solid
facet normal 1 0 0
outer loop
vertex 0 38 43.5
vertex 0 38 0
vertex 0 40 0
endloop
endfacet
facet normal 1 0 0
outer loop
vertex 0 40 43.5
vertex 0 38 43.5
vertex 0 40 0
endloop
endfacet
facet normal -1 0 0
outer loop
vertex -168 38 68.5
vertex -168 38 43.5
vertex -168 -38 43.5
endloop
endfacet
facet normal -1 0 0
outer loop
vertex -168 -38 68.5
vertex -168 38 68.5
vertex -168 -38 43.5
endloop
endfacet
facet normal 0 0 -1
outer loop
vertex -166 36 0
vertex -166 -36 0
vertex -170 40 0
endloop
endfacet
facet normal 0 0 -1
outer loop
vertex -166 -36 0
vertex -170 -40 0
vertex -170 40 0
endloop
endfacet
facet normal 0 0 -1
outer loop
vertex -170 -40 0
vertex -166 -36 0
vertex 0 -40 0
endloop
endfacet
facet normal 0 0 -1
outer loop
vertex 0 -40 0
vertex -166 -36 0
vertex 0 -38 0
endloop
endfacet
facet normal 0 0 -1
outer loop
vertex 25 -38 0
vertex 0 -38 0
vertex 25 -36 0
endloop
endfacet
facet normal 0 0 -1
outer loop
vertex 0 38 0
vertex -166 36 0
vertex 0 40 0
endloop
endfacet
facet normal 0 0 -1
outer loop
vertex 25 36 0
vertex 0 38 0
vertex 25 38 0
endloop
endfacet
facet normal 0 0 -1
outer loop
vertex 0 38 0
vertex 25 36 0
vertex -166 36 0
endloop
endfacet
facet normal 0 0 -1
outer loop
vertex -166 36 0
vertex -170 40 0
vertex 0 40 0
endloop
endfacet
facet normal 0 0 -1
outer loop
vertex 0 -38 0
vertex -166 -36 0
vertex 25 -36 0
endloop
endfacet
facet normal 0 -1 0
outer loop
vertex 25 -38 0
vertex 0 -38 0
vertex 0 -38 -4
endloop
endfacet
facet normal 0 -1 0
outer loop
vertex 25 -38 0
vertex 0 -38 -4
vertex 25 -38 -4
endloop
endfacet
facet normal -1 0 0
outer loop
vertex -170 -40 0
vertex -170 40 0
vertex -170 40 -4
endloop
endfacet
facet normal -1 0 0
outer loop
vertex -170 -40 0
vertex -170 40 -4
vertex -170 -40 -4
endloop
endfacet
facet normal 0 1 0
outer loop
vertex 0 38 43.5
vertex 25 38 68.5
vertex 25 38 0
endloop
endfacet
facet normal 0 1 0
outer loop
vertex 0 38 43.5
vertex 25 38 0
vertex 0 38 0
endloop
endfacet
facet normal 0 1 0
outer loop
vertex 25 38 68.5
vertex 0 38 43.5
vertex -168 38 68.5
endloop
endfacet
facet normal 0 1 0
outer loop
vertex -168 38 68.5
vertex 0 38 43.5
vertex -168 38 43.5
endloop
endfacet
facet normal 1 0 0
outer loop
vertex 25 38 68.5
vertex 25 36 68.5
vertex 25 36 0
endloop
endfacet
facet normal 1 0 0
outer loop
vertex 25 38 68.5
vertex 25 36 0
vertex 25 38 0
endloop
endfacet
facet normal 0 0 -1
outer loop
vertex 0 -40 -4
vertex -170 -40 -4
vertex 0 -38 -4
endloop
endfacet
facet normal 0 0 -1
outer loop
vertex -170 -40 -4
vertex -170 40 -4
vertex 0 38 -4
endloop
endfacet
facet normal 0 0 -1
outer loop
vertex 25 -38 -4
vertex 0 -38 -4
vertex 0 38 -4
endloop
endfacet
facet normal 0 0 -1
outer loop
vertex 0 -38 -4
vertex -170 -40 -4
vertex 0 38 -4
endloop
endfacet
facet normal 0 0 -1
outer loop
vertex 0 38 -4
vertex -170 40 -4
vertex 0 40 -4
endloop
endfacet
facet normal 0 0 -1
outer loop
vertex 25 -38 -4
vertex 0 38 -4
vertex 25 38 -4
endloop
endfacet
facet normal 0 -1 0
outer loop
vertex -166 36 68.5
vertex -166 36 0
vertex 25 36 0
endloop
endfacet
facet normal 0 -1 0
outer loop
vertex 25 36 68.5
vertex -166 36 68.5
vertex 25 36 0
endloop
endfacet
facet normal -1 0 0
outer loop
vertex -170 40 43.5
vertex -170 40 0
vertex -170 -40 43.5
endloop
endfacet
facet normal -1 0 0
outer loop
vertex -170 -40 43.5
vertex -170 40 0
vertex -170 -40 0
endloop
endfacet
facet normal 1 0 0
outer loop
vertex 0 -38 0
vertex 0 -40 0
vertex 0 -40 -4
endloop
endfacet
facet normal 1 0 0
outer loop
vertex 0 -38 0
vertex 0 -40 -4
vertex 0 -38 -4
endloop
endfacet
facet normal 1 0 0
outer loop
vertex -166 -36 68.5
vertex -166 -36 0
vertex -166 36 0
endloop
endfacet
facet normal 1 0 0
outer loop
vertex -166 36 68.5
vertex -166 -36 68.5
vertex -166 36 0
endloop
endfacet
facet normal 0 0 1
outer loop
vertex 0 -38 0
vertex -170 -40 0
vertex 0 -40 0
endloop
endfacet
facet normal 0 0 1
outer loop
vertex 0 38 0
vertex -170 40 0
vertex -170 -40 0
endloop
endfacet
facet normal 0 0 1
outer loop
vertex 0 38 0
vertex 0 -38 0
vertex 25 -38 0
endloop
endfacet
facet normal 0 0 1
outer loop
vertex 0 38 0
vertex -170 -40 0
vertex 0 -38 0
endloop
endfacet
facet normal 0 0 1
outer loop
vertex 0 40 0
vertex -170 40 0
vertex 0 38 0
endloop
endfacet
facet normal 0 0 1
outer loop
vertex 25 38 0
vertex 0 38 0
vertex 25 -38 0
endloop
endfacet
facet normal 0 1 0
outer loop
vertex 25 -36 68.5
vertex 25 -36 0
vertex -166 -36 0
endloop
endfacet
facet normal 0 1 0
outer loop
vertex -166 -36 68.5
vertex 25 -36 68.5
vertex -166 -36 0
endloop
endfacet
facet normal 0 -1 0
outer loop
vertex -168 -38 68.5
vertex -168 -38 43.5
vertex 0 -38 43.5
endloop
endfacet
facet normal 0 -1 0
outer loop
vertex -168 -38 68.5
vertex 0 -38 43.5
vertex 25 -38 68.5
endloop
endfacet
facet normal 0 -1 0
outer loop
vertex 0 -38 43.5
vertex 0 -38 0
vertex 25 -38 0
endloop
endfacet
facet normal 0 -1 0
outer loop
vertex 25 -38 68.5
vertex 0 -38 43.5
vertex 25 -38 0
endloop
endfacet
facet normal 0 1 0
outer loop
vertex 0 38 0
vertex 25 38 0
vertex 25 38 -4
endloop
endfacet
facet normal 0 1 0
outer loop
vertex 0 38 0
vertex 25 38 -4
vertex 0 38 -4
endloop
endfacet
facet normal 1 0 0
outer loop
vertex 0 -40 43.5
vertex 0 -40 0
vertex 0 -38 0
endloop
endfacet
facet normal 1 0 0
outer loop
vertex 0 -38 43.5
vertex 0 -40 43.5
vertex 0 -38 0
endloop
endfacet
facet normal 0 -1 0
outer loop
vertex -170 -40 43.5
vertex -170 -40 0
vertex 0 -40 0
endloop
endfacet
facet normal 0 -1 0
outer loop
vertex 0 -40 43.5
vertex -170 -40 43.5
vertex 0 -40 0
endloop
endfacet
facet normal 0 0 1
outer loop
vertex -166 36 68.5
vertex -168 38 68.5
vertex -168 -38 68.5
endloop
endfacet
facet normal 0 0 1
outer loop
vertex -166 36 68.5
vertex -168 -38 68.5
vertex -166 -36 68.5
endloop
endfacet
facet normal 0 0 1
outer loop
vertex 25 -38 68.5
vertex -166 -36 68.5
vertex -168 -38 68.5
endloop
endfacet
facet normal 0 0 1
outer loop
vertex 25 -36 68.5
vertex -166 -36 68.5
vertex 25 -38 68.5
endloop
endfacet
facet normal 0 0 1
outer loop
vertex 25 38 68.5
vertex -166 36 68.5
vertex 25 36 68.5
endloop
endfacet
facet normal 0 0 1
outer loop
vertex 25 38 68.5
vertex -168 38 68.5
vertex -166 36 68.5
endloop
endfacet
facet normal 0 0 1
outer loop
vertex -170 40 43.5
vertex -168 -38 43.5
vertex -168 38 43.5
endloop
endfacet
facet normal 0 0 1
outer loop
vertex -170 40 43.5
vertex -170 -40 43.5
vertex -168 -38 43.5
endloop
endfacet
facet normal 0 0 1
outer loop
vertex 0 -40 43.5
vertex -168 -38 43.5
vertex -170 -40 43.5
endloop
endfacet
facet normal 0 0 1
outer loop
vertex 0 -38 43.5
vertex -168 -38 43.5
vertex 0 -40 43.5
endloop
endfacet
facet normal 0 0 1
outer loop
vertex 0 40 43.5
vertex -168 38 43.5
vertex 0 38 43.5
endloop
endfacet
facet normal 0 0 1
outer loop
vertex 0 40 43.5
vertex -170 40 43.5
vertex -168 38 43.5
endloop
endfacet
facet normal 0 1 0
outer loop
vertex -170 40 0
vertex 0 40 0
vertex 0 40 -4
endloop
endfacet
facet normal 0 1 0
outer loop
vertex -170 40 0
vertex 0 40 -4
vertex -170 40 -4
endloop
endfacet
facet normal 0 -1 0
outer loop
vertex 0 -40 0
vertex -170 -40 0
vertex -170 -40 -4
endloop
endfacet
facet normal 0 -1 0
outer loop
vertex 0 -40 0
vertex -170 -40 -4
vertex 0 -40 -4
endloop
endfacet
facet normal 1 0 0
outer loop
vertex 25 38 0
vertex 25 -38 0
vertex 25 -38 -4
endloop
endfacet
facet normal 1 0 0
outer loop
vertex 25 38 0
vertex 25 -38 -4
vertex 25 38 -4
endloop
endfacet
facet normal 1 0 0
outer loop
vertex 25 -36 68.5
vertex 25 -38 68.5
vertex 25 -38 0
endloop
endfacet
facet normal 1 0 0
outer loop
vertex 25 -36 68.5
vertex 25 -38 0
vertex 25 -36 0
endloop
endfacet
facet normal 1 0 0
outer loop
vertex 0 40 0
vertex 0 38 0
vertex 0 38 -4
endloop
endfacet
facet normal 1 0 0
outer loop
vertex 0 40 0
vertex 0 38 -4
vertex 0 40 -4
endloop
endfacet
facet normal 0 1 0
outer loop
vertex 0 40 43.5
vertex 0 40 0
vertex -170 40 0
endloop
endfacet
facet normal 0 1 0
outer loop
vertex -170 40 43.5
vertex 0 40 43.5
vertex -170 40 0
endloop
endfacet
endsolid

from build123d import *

# Parameters (mm, degrees)
F0_W     = 25
F0_H     = 2
F1_DEPTH = 43.5
F0_H_2   = 72
F2_DEPTH = 4
F4_DEPTH = 25


with BuildPart() as f1:
    # F0 (on Top) → F1 (new body)
    with BuildSketch(Plane.XY):
        Polygon((-166, 0), (-166, 36), (0, 36), (25, 36), (25, 38), (0, 38), (0, 40), (-170, 40), (-170, -40), (0, -40), (0, -38), (0, -36), (-166, -36), align=None)
        with Locations((12.5, -37)):
            Rectangle(F0_W, F0_H)
    extrude(amount=F1_DEPTH)

    # F3 (on face) → F4 (join)
    with BuildSketch(Plane.XY.offset(43.5)):
        Polygon((-166, 0), (-166, 36), (25, 36), (25, 38), (-168, 38), (-168, 0), align=None)
        Polygon((-166, -36), (-166, 0), (-168, 0), (-168, -38), (25, -38), (25, -36), align=None)
    extrude(amount=F4_DEPTH)


with BuildPart() as f2:
    # F0 (on Top) → F2 (new body)
    with BuildSketch(Plane.XY):
        Polygon((-166, 0), (-166, 36), (0, 36), (25, 36), (25, 38), (0, 38), (0, 40), (-170, 40), (-170, -40), (0, -40), (0, -38), (0, -36), (-166, -36), align=None)
        with Locations((12.5, -37)):
            Rectangle(F0_W, F0_H)
        Polygon((0, 36), (-166, 36), (-166, 0), (-166, -36), (0, -36), align=None)
        with Locations((12.5, 0)):
            Rectangle(F0_W, F0_H_2)
    extrude(amount=-F2_DEPTH)


solid = Compound([f1.part, f2.part])
